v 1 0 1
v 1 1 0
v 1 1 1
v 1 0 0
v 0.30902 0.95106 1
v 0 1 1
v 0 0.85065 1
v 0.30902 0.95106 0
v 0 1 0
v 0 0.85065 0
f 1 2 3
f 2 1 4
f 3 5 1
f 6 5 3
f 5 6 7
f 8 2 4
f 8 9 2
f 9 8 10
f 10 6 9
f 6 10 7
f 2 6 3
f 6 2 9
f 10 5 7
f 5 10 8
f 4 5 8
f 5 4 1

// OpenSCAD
// bogie_width=50;
// bogie_length=100;
// bogie_height=40;
// bogie_wall_width=10;
// lid_square_height = 5;
// lid_height = 2.4;
// lid_connector_height = 10;
// lid_connector_radius_outer = 4;
// lid_connector_depth = 15;
// $fn = 64;

// train_length = 250;
// train_width = 120;
// train_height = 120;
// train_wall_thickness = 10;
// train_bottom_thickness = train_wall_thickness*2;


module train(
              bogie_width,
              bogie_length,
              bogie_height,
              bogie_wall_width,
              lid_square_height,
              lid_height,
              lid_connector_height,
              lid_connector_radius_outer,
              lid_connector_depth,
              train_width,
              train_length,
              train_height,
              train_wall_thickness,
              train_bottom_thickness,
              at_center,
              with_sides
              ) {
  adjust = train_wall_thickness / 2; 
  // Creating bottom of train, and 2 x "lady-parts" ;-)
  difference() {
    cube(size=[train_length,train_width,train_bottom_thickness], center=at_center);
    translate([(train_length/2)-(bogie_length/2+0.5),0,0]){
      cylinder(h=train_bottom_thickness+1, r = lid_connector_radius_outer, center=at_center);
    }
    translate([(-train_length/2)-(-bogie_length/2+0.5),0,0]){
      cylinder(h=train_bottom_thickness+1, r = lid_connector_radius_outer, center=at_center);
    }
    translate([(train_length/2)-(bogie_length/2+0.5),0,-9]){
      rotate([180,0,0]) {
        cylinder(h=lid_connector_depth, r=lid_connector_radius_outer+1,center=at_center);
      }
    }
    translate([(-train_length/2)-(-bogie_length/2+0.5),0,-9]){
      rotate([180,0,0]) {
        cylinder(h=lid_connector_depth, r=lid_connector_radius_outer+1,center=at_center);
      }
    }
  }    

  if(with_sides) {
  // Side 1
    translate([0, ((train_width/2)-adjust),(train_height/2)]) {
      rotate([90,0,0]) {
        cube([train_length,train_height,train_wall_thickness], center=at_center);
      }
    }
    // Side 2
    translate([0, -((train_width/2)-adjust),(train_height/2)]) {
      rotate([90,0,0]) {
        cube([train_length,train_height,train_wall_thickness], center=at_center);
      }
    }
    // Front

    translate([-(train_length/2)+adjust,0,train_height/2]) {  
      rotate([0, 0, 90]) {
        cube([train_width,train_wall_thickness,train_height], center=at_center);
      }
    }

    translate([(train_length/2)-adjust, 0, train_height/2]) {
      difference() {   
        rotate([0, 0, 90]) {
          cube([train_width,train_wall_thickness,train_height], center=at_center);
        }
        translate([-10, -5, ((train_height/2)-12)-(train_height/2)-5]) {
          #cube([20,12,12]);
        }
        translate([-10, -35, ((train_height/2)-13)-(train_height/2)-5]) {
          #cube([20,13,13]);
        }
      }
    }
  }
}


train();
